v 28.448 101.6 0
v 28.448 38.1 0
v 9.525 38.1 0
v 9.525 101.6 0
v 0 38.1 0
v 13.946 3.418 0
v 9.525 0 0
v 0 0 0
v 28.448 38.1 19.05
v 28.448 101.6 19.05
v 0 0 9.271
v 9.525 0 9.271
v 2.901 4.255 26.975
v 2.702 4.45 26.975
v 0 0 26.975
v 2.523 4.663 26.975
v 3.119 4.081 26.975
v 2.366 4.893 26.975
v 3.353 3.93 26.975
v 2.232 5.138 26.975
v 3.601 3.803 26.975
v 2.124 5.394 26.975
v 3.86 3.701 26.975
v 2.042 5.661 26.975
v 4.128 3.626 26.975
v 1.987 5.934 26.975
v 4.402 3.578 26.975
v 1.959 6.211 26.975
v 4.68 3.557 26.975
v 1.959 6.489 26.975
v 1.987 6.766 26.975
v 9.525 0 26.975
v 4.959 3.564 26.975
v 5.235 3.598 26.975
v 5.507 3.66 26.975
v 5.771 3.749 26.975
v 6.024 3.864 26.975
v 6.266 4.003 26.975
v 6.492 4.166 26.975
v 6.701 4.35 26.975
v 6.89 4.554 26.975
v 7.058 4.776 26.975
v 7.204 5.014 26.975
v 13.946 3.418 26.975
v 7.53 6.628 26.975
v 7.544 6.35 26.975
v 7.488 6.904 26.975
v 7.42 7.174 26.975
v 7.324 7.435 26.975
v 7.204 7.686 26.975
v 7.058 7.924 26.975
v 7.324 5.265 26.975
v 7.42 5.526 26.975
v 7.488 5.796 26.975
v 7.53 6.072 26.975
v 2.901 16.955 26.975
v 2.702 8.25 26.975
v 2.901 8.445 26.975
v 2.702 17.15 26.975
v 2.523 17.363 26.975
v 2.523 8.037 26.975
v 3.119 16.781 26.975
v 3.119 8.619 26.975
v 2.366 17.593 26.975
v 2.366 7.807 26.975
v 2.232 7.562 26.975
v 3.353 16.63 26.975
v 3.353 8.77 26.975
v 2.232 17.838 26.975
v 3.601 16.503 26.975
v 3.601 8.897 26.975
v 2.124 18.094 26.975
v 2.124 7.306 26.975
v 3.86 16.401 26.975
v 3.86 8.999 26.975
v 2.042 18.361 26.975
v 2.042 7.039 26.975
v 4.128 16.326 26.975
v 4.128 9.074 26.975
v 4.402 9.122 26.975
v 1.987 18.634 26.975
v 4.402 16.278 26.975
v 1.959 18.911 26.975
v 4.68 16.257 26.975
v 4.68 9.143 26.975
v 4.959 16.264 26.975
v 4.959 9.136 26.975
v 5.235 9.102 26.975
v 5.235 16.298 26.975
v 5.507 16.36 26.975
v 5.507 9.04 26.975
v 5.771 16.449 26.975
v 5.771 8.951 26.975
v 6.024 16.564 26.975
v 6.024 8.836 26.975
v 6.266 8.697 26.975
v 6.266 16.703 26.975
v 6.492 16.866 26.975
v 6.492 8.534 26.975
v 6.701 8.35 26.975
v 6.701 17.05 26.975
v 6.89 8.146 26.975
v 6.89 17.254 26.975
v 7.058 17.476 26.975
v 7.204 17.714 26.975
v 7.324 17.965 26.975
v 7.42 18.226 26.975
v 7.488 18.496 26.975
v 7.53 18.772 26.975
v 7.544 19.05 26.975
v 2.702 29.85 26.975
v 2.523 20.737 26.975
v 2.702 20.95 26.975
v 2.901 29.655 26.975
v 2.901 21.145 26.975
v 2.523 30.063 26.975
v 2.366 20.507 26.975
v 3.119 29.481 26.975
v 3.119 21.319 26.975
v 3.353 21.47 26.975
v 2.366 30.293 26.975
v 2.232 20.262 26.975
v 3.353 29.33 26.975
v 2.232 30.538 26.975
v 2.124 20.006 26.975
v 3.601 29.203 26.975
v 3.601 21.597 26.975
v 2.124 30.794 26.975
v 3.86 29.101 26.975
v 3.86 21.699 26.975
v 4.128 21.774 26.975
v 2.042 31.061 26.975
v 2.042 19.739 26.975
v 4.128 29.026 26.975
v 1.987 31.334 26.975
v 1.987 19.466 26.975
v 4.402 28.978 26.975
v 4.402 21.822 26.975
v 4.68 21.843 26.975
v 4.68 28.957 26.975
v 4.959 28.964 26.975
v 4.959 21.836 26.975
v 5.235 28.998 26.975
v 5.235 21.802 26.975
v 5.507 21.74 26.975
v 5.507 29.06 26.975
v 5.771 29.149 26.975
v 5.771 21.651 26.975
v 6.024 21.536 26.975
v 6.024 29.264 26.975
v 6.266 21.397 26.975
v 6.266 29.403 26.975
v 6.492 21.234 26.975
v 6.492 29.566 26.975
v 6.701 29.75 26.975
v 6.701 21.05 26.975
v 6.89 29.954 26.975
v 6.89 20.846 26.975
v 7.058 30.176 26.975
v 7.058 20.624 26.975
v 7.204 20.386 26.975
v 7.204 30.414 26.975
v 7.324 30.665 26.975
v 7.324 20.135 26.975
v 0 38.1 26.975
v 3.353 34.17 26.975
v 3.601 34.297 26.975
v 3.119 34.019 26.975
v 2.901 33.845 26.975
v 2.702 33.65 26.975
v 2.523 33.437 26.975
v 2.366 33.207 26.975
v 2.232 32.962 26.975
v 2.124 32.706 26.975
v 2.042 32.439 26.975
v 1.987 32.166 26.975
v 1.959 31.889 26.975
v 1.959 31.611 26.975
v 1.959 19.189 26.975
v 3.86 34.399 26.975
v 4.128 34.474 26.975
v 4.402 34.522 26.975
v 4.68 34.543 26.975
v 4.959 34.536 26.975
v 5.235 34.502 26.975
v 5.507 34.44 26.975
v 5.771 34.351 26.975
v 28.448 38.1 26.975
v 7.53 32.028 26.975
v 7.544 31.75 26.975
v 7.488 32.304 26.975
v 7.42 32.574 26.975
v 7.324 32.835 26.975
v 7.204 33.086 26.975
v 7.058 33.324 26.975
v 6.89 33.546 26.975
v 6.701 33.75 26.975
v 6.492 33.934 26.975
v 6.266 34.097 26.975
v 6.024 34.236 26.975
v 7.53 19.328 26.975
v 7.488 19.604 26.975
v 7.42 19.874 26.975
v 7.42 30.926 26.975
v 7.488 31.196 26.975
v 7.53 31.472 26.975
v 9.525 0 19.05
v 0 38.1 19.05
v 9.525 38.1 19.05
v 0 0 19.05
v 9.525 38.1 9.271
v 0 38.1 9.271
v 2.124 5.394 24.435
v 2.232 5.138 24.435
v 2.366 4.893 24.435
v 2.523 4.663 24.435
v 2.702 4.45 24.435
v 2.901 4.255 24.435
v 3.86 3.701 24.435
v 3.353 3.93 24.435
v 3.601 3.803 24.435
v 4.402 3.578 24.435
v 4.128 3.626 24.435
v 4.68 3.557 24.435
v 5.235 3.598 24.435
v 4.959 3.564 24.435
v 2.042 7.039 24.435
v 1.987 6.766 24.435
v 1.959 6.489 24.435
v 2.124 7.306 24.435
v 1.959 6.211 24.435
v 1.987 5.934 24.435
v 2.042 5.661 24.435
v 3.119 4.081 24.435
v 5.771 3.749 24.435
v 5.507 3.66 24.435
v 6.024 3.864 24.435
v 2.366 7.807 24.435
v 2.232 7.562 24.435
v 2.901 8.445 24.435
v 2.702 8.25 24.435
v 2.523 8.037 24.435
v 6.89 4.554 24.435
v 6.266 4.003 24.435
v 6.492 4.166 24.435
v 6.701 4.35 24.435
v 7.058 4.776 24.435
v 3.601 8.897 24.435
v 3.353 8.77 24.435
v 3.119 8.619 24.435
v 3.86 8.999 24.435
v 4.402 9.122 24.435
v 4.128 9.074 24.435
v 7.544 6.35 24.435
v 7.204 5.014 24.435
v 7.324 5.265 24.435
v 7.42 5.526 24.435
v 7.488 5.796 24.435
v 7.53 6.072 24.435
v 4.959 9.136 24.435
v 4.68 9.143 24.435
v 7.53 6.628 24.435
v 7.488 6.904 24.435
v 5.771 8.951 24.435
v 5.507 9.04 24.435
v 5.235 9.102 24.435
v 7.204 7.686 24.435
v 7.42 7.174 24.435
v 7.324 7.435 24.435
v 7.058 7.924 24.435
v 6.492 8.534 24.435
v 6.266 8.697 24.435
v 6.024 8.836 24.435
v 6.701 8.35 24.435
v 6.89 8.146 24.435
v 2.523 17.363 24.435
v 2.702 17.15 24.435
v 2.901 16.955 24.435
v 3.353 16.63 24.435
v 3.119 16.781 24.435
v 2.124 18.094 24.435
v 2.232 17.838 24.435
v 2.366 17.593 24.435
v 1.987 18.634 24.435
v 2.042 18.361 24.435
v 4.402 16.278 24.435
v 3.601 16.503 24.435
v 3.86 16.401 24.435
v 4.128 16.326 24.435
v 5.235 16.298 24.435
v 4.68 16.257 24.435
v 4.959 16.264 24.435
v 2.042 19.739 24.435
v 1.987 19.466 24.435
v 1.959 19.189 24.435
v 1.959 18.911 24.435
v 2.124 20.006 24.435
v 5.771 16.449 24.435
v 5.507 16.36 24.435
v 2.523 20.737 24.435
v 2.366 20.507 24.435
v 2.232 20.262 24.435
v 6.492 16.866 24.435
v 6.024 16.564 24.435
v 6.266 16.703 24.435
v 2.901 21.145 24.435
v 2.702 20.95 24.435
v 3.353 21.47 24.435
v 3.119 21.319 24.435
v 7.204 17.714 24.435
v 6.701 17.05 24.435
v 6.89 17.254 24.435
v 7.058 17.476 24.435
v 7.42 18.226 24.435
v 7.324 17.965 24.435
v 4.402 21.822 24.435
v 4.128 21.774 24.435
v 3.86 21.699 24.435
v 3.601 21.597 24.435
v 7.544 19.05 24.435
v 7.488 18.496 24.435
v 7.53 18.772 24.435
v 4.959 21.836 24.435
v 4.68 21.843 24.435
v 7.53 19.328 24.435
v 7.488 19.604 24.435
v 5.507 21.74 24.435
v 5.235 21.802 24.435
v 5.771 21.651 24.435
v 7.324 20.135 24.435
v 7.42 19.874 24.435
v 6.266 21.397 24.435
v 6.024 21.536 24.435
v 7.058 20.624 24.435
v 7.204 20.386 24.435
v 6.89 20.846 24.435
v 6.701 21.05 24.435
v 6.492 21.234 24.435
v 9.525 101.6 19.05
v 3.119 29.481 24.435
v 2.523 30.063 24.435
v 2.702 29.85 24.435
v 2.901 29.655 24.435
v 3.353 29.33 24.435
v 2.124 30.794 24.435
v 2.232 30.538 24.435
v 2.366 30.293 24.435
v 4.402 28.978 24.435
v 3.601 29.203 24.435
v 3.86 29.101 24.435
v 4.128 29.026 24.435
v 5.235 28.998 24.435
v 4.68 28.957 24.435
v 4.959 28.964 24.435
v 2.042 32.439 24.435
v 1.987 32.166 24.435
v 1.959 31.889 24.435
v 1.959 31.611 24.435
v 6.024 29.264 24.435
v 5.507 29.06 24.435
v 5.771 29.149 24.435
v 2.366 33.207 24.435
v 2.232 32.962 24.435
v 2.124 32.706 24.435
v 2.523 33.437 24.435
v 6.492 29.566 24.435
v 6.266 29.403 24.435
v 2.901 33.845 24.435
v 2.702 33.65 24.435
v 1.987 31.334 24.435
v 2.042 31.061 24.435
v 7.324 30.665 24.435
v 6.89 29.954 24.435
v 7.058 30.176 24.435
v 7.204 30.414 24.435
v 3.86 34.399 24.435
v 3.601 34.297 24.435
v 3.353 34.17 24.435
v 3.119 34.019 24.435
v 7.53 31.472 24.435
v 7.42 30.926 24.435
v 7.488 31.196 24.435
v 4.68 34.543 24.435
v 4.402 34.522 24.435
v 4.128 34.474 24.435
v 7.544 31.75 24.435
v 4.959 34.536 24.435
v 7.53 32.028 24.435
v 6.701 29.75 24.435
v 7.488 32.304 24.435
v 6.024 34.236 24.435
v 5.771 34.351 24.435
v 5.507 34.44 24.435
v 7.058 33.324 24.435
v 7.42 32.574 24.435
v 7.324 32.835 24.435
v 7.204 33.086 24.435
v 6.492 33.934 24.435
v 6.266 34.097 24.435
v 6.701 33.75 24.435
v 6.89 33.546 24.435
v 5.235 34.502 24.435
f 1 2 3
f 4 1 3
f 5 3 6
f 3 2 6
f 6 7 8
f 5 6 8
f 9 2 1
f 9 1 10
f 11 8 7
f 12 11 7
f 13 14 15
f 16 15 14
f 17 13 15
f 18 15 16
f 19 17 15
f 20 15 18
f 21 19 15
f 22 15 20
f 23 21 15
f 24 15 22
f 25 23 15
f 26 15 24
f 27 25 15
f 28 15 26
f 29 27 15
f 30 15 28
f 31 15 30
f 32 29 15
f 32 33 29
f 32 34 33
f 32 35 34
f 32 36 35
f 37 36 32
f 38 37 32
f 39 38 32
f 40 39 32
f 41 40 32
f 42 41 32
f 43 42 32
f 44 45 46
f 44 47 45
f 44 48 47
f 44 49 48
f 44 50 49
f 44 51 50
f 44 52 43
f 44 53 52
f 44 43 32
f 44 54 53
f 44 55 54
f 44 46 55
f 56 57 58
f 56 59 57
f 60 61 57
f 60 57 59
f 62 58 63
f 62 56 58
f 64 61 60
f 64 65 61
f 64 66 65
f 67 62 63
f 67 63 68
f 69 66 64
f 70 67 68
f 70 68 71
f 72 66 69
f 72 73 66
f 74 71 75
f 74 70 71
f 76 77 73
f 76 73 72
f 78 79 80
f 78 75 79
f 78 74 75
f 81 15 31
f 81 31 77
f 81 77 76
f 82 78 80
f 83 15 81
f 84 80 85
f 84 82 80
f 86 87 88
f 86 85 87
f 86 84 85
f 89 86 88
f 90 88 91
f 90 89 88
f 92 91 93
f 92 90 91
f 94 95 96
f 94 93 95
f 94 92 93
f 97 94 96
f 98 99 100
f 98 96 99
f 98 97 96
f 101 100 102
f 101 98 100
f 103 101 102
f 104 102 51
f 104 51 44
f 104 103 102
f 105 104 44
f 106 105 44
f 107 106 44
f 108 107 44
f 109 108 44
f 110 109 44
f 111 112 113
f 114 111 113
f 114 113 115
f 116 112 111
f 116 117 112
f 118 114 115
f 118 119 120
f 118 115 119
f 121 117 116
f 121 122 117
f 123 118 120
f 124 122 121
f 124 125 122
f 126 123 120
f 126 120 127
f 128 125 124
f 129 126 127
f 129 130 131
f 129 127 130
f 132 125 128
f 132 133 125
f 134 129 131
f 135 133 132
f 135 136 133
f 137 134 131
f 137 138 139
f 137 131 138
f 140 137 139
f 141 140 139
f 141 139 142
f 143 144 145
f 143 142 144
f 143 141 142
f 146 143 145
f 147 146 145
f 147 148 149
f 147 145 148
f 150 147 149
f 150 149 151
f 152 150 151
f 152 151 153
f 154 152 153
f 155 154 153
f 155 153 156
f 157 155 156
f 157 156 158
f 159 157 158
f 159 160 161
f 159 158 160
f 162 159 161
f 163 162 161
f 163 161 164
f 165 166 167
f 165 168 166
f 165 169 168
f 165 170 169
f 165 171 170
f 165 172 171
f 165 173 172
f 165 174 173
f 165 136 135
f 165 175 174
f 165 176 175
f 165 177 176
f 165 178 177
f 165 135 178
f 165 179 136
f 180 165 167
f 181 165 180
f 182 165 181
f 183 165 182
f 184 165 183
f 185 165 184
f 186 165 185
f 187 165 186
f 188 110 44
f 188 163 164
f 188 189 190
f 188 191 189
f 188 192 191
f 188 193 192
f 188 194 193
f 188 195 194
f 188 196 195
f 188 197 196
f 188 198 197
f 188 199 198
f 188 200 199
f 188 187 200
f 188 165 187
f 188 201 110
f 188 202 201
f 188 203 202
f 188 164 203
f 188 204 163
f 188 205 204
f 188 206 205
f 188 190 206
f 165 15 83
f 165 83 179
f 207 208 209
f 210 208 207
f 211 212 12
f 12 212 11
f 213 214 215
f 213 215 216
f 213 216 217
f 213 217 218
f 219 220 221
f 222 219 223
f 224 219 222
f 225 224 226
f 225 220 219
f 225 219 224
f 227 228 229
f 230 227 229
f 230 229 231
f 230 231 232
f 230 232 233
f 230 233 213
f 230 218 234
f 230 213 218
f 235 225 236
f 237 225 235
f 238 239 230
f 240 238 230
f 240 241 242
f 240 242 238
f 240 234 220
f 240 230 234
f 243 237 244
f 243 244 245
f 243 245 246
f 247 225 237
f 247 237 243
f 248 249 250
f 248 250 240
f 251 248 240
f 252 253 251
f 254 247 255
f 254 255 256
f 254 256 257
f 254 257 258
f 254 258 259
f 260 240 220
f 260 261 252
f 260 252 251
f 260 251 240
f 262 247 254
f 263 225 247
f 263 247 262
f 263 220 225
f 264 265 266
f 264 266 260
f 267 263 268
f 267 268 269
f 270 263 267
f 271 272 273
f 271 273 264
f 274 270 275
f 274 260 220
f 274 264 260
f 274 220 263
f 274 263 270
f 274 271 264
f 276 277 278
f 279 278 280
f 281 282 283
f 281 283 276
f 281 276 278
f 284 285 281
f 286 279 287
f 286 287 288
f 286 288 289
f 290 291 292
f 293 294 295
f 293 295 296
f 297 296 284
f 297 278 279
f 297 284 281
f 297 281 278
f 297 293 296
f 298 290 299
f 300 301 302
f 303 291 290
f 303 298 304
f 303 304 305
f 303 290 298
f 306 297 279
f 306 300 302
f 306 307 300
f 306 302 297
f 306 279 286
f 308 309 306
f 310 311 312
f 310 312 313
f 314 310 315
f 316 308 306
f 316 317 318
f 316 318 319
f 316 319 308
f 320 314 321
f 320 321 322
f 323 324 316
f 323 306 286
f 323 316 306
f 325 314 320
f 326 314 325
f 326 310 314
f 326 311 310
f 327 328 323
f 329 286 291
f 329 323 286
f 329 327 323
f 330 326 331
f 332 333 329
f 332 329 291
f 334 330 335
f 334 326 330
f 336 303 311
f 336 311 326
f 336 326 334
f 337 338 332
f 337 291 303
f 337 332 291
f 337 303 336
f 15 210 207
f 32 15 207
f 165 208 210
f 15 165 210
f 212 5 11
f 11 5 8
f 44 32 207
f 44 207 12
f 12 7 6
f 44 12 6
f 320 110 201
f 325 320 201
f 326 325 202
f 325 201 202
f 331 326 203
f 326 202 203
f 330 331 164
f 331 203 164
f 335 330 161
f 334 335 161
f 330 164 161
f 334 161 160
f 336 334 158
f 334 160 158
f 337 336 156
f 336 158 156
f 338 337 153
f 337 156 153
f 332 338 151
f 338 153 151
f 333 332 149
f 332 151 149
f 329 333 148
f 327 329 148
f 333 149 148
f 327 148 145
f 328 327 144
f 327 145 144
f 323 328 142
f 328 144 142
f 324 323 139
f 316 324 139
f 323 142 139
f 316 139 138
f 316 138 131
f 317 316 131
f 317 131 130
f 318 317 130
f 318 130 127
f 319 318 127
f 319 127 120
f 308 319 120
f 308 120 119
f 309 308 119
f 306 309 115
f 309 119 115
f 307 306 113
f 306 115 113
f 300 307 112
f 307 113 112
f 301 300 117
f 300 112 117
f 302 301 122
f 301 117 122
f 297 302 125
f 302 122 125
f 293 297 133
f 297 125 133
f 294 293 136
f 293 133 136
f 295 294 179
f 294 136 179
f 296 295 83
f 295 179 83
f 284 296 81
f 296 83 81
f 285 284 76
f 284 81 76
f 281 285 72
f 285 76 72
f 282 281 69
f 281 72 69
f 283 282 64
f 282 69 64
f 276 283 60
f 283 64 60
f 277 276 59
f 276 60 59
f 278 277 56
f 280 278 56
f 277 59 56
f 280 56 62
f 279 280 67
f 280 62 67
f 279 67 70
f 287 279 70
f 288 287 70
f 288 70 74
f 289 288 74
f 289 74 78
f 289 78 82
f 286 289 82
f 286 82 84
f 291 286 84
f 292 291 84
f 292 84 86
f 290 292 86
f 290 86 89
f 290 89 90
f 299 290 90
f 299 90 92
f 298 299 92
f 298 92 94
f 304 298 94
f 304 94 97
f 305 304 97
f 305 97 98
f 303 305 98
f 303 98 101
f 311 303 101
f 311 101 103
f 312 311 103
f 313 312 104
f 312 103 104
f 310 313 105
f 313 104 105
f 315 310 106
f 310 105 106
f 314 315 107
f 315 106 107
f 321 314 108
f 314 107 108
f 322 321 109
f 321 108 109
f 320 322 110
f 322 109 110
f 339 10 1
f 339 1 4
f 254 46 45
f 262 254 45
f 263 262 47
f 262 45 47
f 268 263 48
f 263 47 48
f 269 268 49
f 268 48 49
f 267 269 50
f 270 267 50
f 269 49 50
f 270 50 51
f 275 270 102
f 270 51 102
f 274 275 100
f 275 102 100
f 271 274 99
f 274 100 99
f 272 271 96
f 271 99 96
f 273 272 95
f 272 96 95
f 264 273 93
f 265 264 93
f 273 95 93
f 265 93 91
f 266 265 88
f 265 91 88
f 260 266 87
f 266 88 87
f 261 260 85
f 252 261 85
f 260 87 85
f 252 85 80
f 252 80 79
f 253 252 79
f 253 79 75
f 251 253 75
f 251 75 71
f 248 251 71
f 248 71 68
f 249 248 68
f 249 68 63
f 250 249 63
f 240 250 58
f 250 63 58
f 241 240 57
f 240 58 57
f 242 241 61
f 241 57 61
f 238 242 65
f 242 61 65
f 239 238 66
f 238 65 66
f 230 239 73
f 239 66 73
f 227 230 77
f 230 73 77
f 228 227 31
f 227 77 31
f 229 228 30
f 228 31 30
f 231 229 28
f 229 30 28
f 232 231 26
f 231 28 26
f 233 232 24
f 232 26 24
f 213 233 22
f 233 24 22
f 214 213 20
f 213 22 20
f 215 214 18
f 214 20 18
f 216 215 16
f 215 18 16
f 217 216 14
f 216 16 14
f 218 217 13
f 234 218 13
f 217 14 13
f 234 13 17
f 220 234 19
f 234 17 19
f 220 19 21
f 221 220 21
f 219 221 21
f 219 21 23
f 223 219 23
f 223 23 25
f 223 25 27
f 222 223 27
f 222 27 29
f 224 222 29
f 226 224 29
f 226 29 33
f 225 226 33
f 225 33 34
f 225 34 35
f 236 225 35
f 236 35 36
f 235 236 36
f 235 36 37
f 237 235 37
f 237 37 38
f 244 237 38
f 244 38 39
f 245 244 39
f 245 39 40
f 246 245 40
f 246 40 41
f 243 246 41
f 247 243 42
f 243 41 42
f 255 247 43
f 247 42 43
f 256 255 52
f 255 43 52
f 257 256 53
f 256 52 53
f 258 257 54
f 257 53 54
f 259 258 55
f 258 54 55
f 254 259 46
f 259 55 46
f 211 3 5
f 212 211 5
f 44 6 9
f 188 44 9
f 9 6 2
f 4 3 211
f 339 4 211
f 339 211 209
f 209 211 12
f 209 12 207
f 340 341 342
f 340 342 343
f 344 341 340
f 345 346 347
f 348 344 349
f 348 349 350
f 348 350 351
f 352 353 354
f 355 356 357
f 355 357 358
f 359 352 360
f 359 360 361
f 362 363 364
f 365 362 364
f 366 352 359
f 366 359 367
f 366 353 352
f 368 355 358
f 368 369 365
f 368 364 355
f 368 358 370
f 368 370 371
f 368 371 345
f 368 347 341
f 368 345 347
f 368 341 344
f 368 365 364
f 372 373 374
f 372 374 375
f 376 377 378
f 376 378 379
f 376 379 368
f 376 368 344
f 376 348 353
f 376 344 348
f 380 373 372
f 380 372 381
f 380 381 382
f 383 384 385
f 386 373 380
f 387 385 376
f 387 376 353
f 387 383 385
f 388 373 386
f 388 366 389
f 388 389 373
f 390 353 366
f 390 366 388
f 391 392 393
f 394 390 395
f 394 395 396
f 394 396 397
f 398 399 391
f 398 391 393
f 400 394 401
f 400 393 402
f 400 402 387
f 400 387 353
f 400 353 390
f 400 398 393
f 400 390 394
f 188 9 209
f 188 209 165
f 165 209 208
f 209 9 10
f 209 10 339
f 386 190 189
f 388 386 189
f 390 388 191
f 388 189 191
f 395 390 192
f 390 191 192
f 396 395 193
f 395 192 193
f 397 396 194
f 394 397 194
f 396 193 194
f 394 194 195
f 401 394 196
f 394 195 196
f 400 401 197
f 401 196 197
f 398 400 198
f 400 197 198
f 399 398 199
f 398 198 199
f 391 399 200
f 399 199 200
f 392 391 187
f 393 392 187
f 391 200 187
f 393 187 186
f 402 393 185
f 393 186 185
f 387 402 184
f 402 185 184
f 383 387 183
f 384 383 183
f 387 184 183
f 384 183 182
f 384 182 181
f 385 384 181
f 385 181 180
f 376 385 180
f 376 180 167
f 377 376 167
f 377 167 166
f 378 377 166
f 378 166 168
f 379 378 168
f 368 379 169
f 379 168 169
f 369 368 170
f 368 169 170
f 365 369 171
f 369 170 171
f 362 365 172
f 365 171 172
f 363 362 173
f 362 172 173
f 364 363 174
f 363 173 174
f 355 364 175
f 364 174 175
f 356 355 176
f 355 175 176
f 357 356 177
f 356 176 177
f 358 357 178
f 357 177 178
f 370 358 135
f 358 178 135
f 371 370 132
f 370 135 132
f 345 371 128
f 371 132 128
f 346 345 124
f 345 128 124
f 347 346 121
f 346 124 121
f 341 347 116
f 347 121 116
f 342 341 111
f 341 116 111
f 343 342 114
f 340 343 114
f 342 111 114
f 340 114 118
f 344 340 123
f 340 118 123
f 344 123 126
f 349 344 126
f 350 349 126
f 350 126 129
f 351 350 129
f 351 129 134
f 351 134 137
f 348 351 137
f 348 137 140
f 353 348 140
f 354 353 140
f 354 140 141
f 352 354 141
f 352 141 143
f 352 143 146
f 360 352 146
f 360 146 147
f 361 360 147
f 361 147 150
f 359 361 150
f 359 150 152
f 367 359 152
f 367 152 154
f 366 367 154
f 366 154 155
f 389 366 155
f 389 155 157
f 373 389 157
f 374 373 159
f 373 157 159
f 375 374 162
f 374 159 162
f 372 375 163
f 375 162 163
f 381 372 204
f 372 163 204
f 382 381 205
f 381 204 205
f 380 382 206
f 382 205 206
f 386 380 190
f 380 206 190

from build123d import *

# Parameters (mm, degrees)
F1_DEPTH = 26.9748
F2_W     = 38.1
F2_H     = 9.779
F3_DEPTH = 9.525
F4_W     = 18.923
F4_H     = 19.05
F5_DEPTH = 63.5
F6_R     = 2.794
F7_DEPTH = 2.54


with BuildPart() as f1:
    # F0 (on Top) → F1 (new body)
    with BuildSketch(Plane.XY):
        Polygon((0, 38.1), (0, 0), (9.525, 0), (13.945783, 3.417956), (28.448, 38.1), align=None)
    extrude(amount=F1_DEPTH)

    # F2 (on face) → F3 (cut)
    with BuildSketch(Plane(origin=(0, 0, 0), x_dir=(0, -1, 0), z_dir=(-1, 0, 0))):
        with Locations((-19.05, 14.1605)):
            Rectangle(F2_W, F2_H)
    extrude(amount=-F3_DEPTH, mode=Mode.SUBTRACT)

    # F4 (on face) → F5 (join)
    with BuildSketch(Plane(origin=(0, 38.1, 0), x_dir=(-1, 0, 0), z_dir=(0, 1, 0))):
        with Locations((-18.9865, 9.525)):
            Rectangle(F4_W, F4_H)
    extrude(amount=F5_DEPTH)

    # F6 (on face) → F7 (cut)
    with BuildSketch(Plane.XY.offset(26.9748)):
        with Locations((4.7498, 31.75)):
            Circle(F6_R)
        with Locations((4.7498, 19.05)):
            Circle(F6_R)
        with Locations((4.7498, 6.35)):
            Circle(F6_R)
    extrude(amount=-F7_DEPTH, mode=Mode.SUBTRACT)


solid = f1.part
